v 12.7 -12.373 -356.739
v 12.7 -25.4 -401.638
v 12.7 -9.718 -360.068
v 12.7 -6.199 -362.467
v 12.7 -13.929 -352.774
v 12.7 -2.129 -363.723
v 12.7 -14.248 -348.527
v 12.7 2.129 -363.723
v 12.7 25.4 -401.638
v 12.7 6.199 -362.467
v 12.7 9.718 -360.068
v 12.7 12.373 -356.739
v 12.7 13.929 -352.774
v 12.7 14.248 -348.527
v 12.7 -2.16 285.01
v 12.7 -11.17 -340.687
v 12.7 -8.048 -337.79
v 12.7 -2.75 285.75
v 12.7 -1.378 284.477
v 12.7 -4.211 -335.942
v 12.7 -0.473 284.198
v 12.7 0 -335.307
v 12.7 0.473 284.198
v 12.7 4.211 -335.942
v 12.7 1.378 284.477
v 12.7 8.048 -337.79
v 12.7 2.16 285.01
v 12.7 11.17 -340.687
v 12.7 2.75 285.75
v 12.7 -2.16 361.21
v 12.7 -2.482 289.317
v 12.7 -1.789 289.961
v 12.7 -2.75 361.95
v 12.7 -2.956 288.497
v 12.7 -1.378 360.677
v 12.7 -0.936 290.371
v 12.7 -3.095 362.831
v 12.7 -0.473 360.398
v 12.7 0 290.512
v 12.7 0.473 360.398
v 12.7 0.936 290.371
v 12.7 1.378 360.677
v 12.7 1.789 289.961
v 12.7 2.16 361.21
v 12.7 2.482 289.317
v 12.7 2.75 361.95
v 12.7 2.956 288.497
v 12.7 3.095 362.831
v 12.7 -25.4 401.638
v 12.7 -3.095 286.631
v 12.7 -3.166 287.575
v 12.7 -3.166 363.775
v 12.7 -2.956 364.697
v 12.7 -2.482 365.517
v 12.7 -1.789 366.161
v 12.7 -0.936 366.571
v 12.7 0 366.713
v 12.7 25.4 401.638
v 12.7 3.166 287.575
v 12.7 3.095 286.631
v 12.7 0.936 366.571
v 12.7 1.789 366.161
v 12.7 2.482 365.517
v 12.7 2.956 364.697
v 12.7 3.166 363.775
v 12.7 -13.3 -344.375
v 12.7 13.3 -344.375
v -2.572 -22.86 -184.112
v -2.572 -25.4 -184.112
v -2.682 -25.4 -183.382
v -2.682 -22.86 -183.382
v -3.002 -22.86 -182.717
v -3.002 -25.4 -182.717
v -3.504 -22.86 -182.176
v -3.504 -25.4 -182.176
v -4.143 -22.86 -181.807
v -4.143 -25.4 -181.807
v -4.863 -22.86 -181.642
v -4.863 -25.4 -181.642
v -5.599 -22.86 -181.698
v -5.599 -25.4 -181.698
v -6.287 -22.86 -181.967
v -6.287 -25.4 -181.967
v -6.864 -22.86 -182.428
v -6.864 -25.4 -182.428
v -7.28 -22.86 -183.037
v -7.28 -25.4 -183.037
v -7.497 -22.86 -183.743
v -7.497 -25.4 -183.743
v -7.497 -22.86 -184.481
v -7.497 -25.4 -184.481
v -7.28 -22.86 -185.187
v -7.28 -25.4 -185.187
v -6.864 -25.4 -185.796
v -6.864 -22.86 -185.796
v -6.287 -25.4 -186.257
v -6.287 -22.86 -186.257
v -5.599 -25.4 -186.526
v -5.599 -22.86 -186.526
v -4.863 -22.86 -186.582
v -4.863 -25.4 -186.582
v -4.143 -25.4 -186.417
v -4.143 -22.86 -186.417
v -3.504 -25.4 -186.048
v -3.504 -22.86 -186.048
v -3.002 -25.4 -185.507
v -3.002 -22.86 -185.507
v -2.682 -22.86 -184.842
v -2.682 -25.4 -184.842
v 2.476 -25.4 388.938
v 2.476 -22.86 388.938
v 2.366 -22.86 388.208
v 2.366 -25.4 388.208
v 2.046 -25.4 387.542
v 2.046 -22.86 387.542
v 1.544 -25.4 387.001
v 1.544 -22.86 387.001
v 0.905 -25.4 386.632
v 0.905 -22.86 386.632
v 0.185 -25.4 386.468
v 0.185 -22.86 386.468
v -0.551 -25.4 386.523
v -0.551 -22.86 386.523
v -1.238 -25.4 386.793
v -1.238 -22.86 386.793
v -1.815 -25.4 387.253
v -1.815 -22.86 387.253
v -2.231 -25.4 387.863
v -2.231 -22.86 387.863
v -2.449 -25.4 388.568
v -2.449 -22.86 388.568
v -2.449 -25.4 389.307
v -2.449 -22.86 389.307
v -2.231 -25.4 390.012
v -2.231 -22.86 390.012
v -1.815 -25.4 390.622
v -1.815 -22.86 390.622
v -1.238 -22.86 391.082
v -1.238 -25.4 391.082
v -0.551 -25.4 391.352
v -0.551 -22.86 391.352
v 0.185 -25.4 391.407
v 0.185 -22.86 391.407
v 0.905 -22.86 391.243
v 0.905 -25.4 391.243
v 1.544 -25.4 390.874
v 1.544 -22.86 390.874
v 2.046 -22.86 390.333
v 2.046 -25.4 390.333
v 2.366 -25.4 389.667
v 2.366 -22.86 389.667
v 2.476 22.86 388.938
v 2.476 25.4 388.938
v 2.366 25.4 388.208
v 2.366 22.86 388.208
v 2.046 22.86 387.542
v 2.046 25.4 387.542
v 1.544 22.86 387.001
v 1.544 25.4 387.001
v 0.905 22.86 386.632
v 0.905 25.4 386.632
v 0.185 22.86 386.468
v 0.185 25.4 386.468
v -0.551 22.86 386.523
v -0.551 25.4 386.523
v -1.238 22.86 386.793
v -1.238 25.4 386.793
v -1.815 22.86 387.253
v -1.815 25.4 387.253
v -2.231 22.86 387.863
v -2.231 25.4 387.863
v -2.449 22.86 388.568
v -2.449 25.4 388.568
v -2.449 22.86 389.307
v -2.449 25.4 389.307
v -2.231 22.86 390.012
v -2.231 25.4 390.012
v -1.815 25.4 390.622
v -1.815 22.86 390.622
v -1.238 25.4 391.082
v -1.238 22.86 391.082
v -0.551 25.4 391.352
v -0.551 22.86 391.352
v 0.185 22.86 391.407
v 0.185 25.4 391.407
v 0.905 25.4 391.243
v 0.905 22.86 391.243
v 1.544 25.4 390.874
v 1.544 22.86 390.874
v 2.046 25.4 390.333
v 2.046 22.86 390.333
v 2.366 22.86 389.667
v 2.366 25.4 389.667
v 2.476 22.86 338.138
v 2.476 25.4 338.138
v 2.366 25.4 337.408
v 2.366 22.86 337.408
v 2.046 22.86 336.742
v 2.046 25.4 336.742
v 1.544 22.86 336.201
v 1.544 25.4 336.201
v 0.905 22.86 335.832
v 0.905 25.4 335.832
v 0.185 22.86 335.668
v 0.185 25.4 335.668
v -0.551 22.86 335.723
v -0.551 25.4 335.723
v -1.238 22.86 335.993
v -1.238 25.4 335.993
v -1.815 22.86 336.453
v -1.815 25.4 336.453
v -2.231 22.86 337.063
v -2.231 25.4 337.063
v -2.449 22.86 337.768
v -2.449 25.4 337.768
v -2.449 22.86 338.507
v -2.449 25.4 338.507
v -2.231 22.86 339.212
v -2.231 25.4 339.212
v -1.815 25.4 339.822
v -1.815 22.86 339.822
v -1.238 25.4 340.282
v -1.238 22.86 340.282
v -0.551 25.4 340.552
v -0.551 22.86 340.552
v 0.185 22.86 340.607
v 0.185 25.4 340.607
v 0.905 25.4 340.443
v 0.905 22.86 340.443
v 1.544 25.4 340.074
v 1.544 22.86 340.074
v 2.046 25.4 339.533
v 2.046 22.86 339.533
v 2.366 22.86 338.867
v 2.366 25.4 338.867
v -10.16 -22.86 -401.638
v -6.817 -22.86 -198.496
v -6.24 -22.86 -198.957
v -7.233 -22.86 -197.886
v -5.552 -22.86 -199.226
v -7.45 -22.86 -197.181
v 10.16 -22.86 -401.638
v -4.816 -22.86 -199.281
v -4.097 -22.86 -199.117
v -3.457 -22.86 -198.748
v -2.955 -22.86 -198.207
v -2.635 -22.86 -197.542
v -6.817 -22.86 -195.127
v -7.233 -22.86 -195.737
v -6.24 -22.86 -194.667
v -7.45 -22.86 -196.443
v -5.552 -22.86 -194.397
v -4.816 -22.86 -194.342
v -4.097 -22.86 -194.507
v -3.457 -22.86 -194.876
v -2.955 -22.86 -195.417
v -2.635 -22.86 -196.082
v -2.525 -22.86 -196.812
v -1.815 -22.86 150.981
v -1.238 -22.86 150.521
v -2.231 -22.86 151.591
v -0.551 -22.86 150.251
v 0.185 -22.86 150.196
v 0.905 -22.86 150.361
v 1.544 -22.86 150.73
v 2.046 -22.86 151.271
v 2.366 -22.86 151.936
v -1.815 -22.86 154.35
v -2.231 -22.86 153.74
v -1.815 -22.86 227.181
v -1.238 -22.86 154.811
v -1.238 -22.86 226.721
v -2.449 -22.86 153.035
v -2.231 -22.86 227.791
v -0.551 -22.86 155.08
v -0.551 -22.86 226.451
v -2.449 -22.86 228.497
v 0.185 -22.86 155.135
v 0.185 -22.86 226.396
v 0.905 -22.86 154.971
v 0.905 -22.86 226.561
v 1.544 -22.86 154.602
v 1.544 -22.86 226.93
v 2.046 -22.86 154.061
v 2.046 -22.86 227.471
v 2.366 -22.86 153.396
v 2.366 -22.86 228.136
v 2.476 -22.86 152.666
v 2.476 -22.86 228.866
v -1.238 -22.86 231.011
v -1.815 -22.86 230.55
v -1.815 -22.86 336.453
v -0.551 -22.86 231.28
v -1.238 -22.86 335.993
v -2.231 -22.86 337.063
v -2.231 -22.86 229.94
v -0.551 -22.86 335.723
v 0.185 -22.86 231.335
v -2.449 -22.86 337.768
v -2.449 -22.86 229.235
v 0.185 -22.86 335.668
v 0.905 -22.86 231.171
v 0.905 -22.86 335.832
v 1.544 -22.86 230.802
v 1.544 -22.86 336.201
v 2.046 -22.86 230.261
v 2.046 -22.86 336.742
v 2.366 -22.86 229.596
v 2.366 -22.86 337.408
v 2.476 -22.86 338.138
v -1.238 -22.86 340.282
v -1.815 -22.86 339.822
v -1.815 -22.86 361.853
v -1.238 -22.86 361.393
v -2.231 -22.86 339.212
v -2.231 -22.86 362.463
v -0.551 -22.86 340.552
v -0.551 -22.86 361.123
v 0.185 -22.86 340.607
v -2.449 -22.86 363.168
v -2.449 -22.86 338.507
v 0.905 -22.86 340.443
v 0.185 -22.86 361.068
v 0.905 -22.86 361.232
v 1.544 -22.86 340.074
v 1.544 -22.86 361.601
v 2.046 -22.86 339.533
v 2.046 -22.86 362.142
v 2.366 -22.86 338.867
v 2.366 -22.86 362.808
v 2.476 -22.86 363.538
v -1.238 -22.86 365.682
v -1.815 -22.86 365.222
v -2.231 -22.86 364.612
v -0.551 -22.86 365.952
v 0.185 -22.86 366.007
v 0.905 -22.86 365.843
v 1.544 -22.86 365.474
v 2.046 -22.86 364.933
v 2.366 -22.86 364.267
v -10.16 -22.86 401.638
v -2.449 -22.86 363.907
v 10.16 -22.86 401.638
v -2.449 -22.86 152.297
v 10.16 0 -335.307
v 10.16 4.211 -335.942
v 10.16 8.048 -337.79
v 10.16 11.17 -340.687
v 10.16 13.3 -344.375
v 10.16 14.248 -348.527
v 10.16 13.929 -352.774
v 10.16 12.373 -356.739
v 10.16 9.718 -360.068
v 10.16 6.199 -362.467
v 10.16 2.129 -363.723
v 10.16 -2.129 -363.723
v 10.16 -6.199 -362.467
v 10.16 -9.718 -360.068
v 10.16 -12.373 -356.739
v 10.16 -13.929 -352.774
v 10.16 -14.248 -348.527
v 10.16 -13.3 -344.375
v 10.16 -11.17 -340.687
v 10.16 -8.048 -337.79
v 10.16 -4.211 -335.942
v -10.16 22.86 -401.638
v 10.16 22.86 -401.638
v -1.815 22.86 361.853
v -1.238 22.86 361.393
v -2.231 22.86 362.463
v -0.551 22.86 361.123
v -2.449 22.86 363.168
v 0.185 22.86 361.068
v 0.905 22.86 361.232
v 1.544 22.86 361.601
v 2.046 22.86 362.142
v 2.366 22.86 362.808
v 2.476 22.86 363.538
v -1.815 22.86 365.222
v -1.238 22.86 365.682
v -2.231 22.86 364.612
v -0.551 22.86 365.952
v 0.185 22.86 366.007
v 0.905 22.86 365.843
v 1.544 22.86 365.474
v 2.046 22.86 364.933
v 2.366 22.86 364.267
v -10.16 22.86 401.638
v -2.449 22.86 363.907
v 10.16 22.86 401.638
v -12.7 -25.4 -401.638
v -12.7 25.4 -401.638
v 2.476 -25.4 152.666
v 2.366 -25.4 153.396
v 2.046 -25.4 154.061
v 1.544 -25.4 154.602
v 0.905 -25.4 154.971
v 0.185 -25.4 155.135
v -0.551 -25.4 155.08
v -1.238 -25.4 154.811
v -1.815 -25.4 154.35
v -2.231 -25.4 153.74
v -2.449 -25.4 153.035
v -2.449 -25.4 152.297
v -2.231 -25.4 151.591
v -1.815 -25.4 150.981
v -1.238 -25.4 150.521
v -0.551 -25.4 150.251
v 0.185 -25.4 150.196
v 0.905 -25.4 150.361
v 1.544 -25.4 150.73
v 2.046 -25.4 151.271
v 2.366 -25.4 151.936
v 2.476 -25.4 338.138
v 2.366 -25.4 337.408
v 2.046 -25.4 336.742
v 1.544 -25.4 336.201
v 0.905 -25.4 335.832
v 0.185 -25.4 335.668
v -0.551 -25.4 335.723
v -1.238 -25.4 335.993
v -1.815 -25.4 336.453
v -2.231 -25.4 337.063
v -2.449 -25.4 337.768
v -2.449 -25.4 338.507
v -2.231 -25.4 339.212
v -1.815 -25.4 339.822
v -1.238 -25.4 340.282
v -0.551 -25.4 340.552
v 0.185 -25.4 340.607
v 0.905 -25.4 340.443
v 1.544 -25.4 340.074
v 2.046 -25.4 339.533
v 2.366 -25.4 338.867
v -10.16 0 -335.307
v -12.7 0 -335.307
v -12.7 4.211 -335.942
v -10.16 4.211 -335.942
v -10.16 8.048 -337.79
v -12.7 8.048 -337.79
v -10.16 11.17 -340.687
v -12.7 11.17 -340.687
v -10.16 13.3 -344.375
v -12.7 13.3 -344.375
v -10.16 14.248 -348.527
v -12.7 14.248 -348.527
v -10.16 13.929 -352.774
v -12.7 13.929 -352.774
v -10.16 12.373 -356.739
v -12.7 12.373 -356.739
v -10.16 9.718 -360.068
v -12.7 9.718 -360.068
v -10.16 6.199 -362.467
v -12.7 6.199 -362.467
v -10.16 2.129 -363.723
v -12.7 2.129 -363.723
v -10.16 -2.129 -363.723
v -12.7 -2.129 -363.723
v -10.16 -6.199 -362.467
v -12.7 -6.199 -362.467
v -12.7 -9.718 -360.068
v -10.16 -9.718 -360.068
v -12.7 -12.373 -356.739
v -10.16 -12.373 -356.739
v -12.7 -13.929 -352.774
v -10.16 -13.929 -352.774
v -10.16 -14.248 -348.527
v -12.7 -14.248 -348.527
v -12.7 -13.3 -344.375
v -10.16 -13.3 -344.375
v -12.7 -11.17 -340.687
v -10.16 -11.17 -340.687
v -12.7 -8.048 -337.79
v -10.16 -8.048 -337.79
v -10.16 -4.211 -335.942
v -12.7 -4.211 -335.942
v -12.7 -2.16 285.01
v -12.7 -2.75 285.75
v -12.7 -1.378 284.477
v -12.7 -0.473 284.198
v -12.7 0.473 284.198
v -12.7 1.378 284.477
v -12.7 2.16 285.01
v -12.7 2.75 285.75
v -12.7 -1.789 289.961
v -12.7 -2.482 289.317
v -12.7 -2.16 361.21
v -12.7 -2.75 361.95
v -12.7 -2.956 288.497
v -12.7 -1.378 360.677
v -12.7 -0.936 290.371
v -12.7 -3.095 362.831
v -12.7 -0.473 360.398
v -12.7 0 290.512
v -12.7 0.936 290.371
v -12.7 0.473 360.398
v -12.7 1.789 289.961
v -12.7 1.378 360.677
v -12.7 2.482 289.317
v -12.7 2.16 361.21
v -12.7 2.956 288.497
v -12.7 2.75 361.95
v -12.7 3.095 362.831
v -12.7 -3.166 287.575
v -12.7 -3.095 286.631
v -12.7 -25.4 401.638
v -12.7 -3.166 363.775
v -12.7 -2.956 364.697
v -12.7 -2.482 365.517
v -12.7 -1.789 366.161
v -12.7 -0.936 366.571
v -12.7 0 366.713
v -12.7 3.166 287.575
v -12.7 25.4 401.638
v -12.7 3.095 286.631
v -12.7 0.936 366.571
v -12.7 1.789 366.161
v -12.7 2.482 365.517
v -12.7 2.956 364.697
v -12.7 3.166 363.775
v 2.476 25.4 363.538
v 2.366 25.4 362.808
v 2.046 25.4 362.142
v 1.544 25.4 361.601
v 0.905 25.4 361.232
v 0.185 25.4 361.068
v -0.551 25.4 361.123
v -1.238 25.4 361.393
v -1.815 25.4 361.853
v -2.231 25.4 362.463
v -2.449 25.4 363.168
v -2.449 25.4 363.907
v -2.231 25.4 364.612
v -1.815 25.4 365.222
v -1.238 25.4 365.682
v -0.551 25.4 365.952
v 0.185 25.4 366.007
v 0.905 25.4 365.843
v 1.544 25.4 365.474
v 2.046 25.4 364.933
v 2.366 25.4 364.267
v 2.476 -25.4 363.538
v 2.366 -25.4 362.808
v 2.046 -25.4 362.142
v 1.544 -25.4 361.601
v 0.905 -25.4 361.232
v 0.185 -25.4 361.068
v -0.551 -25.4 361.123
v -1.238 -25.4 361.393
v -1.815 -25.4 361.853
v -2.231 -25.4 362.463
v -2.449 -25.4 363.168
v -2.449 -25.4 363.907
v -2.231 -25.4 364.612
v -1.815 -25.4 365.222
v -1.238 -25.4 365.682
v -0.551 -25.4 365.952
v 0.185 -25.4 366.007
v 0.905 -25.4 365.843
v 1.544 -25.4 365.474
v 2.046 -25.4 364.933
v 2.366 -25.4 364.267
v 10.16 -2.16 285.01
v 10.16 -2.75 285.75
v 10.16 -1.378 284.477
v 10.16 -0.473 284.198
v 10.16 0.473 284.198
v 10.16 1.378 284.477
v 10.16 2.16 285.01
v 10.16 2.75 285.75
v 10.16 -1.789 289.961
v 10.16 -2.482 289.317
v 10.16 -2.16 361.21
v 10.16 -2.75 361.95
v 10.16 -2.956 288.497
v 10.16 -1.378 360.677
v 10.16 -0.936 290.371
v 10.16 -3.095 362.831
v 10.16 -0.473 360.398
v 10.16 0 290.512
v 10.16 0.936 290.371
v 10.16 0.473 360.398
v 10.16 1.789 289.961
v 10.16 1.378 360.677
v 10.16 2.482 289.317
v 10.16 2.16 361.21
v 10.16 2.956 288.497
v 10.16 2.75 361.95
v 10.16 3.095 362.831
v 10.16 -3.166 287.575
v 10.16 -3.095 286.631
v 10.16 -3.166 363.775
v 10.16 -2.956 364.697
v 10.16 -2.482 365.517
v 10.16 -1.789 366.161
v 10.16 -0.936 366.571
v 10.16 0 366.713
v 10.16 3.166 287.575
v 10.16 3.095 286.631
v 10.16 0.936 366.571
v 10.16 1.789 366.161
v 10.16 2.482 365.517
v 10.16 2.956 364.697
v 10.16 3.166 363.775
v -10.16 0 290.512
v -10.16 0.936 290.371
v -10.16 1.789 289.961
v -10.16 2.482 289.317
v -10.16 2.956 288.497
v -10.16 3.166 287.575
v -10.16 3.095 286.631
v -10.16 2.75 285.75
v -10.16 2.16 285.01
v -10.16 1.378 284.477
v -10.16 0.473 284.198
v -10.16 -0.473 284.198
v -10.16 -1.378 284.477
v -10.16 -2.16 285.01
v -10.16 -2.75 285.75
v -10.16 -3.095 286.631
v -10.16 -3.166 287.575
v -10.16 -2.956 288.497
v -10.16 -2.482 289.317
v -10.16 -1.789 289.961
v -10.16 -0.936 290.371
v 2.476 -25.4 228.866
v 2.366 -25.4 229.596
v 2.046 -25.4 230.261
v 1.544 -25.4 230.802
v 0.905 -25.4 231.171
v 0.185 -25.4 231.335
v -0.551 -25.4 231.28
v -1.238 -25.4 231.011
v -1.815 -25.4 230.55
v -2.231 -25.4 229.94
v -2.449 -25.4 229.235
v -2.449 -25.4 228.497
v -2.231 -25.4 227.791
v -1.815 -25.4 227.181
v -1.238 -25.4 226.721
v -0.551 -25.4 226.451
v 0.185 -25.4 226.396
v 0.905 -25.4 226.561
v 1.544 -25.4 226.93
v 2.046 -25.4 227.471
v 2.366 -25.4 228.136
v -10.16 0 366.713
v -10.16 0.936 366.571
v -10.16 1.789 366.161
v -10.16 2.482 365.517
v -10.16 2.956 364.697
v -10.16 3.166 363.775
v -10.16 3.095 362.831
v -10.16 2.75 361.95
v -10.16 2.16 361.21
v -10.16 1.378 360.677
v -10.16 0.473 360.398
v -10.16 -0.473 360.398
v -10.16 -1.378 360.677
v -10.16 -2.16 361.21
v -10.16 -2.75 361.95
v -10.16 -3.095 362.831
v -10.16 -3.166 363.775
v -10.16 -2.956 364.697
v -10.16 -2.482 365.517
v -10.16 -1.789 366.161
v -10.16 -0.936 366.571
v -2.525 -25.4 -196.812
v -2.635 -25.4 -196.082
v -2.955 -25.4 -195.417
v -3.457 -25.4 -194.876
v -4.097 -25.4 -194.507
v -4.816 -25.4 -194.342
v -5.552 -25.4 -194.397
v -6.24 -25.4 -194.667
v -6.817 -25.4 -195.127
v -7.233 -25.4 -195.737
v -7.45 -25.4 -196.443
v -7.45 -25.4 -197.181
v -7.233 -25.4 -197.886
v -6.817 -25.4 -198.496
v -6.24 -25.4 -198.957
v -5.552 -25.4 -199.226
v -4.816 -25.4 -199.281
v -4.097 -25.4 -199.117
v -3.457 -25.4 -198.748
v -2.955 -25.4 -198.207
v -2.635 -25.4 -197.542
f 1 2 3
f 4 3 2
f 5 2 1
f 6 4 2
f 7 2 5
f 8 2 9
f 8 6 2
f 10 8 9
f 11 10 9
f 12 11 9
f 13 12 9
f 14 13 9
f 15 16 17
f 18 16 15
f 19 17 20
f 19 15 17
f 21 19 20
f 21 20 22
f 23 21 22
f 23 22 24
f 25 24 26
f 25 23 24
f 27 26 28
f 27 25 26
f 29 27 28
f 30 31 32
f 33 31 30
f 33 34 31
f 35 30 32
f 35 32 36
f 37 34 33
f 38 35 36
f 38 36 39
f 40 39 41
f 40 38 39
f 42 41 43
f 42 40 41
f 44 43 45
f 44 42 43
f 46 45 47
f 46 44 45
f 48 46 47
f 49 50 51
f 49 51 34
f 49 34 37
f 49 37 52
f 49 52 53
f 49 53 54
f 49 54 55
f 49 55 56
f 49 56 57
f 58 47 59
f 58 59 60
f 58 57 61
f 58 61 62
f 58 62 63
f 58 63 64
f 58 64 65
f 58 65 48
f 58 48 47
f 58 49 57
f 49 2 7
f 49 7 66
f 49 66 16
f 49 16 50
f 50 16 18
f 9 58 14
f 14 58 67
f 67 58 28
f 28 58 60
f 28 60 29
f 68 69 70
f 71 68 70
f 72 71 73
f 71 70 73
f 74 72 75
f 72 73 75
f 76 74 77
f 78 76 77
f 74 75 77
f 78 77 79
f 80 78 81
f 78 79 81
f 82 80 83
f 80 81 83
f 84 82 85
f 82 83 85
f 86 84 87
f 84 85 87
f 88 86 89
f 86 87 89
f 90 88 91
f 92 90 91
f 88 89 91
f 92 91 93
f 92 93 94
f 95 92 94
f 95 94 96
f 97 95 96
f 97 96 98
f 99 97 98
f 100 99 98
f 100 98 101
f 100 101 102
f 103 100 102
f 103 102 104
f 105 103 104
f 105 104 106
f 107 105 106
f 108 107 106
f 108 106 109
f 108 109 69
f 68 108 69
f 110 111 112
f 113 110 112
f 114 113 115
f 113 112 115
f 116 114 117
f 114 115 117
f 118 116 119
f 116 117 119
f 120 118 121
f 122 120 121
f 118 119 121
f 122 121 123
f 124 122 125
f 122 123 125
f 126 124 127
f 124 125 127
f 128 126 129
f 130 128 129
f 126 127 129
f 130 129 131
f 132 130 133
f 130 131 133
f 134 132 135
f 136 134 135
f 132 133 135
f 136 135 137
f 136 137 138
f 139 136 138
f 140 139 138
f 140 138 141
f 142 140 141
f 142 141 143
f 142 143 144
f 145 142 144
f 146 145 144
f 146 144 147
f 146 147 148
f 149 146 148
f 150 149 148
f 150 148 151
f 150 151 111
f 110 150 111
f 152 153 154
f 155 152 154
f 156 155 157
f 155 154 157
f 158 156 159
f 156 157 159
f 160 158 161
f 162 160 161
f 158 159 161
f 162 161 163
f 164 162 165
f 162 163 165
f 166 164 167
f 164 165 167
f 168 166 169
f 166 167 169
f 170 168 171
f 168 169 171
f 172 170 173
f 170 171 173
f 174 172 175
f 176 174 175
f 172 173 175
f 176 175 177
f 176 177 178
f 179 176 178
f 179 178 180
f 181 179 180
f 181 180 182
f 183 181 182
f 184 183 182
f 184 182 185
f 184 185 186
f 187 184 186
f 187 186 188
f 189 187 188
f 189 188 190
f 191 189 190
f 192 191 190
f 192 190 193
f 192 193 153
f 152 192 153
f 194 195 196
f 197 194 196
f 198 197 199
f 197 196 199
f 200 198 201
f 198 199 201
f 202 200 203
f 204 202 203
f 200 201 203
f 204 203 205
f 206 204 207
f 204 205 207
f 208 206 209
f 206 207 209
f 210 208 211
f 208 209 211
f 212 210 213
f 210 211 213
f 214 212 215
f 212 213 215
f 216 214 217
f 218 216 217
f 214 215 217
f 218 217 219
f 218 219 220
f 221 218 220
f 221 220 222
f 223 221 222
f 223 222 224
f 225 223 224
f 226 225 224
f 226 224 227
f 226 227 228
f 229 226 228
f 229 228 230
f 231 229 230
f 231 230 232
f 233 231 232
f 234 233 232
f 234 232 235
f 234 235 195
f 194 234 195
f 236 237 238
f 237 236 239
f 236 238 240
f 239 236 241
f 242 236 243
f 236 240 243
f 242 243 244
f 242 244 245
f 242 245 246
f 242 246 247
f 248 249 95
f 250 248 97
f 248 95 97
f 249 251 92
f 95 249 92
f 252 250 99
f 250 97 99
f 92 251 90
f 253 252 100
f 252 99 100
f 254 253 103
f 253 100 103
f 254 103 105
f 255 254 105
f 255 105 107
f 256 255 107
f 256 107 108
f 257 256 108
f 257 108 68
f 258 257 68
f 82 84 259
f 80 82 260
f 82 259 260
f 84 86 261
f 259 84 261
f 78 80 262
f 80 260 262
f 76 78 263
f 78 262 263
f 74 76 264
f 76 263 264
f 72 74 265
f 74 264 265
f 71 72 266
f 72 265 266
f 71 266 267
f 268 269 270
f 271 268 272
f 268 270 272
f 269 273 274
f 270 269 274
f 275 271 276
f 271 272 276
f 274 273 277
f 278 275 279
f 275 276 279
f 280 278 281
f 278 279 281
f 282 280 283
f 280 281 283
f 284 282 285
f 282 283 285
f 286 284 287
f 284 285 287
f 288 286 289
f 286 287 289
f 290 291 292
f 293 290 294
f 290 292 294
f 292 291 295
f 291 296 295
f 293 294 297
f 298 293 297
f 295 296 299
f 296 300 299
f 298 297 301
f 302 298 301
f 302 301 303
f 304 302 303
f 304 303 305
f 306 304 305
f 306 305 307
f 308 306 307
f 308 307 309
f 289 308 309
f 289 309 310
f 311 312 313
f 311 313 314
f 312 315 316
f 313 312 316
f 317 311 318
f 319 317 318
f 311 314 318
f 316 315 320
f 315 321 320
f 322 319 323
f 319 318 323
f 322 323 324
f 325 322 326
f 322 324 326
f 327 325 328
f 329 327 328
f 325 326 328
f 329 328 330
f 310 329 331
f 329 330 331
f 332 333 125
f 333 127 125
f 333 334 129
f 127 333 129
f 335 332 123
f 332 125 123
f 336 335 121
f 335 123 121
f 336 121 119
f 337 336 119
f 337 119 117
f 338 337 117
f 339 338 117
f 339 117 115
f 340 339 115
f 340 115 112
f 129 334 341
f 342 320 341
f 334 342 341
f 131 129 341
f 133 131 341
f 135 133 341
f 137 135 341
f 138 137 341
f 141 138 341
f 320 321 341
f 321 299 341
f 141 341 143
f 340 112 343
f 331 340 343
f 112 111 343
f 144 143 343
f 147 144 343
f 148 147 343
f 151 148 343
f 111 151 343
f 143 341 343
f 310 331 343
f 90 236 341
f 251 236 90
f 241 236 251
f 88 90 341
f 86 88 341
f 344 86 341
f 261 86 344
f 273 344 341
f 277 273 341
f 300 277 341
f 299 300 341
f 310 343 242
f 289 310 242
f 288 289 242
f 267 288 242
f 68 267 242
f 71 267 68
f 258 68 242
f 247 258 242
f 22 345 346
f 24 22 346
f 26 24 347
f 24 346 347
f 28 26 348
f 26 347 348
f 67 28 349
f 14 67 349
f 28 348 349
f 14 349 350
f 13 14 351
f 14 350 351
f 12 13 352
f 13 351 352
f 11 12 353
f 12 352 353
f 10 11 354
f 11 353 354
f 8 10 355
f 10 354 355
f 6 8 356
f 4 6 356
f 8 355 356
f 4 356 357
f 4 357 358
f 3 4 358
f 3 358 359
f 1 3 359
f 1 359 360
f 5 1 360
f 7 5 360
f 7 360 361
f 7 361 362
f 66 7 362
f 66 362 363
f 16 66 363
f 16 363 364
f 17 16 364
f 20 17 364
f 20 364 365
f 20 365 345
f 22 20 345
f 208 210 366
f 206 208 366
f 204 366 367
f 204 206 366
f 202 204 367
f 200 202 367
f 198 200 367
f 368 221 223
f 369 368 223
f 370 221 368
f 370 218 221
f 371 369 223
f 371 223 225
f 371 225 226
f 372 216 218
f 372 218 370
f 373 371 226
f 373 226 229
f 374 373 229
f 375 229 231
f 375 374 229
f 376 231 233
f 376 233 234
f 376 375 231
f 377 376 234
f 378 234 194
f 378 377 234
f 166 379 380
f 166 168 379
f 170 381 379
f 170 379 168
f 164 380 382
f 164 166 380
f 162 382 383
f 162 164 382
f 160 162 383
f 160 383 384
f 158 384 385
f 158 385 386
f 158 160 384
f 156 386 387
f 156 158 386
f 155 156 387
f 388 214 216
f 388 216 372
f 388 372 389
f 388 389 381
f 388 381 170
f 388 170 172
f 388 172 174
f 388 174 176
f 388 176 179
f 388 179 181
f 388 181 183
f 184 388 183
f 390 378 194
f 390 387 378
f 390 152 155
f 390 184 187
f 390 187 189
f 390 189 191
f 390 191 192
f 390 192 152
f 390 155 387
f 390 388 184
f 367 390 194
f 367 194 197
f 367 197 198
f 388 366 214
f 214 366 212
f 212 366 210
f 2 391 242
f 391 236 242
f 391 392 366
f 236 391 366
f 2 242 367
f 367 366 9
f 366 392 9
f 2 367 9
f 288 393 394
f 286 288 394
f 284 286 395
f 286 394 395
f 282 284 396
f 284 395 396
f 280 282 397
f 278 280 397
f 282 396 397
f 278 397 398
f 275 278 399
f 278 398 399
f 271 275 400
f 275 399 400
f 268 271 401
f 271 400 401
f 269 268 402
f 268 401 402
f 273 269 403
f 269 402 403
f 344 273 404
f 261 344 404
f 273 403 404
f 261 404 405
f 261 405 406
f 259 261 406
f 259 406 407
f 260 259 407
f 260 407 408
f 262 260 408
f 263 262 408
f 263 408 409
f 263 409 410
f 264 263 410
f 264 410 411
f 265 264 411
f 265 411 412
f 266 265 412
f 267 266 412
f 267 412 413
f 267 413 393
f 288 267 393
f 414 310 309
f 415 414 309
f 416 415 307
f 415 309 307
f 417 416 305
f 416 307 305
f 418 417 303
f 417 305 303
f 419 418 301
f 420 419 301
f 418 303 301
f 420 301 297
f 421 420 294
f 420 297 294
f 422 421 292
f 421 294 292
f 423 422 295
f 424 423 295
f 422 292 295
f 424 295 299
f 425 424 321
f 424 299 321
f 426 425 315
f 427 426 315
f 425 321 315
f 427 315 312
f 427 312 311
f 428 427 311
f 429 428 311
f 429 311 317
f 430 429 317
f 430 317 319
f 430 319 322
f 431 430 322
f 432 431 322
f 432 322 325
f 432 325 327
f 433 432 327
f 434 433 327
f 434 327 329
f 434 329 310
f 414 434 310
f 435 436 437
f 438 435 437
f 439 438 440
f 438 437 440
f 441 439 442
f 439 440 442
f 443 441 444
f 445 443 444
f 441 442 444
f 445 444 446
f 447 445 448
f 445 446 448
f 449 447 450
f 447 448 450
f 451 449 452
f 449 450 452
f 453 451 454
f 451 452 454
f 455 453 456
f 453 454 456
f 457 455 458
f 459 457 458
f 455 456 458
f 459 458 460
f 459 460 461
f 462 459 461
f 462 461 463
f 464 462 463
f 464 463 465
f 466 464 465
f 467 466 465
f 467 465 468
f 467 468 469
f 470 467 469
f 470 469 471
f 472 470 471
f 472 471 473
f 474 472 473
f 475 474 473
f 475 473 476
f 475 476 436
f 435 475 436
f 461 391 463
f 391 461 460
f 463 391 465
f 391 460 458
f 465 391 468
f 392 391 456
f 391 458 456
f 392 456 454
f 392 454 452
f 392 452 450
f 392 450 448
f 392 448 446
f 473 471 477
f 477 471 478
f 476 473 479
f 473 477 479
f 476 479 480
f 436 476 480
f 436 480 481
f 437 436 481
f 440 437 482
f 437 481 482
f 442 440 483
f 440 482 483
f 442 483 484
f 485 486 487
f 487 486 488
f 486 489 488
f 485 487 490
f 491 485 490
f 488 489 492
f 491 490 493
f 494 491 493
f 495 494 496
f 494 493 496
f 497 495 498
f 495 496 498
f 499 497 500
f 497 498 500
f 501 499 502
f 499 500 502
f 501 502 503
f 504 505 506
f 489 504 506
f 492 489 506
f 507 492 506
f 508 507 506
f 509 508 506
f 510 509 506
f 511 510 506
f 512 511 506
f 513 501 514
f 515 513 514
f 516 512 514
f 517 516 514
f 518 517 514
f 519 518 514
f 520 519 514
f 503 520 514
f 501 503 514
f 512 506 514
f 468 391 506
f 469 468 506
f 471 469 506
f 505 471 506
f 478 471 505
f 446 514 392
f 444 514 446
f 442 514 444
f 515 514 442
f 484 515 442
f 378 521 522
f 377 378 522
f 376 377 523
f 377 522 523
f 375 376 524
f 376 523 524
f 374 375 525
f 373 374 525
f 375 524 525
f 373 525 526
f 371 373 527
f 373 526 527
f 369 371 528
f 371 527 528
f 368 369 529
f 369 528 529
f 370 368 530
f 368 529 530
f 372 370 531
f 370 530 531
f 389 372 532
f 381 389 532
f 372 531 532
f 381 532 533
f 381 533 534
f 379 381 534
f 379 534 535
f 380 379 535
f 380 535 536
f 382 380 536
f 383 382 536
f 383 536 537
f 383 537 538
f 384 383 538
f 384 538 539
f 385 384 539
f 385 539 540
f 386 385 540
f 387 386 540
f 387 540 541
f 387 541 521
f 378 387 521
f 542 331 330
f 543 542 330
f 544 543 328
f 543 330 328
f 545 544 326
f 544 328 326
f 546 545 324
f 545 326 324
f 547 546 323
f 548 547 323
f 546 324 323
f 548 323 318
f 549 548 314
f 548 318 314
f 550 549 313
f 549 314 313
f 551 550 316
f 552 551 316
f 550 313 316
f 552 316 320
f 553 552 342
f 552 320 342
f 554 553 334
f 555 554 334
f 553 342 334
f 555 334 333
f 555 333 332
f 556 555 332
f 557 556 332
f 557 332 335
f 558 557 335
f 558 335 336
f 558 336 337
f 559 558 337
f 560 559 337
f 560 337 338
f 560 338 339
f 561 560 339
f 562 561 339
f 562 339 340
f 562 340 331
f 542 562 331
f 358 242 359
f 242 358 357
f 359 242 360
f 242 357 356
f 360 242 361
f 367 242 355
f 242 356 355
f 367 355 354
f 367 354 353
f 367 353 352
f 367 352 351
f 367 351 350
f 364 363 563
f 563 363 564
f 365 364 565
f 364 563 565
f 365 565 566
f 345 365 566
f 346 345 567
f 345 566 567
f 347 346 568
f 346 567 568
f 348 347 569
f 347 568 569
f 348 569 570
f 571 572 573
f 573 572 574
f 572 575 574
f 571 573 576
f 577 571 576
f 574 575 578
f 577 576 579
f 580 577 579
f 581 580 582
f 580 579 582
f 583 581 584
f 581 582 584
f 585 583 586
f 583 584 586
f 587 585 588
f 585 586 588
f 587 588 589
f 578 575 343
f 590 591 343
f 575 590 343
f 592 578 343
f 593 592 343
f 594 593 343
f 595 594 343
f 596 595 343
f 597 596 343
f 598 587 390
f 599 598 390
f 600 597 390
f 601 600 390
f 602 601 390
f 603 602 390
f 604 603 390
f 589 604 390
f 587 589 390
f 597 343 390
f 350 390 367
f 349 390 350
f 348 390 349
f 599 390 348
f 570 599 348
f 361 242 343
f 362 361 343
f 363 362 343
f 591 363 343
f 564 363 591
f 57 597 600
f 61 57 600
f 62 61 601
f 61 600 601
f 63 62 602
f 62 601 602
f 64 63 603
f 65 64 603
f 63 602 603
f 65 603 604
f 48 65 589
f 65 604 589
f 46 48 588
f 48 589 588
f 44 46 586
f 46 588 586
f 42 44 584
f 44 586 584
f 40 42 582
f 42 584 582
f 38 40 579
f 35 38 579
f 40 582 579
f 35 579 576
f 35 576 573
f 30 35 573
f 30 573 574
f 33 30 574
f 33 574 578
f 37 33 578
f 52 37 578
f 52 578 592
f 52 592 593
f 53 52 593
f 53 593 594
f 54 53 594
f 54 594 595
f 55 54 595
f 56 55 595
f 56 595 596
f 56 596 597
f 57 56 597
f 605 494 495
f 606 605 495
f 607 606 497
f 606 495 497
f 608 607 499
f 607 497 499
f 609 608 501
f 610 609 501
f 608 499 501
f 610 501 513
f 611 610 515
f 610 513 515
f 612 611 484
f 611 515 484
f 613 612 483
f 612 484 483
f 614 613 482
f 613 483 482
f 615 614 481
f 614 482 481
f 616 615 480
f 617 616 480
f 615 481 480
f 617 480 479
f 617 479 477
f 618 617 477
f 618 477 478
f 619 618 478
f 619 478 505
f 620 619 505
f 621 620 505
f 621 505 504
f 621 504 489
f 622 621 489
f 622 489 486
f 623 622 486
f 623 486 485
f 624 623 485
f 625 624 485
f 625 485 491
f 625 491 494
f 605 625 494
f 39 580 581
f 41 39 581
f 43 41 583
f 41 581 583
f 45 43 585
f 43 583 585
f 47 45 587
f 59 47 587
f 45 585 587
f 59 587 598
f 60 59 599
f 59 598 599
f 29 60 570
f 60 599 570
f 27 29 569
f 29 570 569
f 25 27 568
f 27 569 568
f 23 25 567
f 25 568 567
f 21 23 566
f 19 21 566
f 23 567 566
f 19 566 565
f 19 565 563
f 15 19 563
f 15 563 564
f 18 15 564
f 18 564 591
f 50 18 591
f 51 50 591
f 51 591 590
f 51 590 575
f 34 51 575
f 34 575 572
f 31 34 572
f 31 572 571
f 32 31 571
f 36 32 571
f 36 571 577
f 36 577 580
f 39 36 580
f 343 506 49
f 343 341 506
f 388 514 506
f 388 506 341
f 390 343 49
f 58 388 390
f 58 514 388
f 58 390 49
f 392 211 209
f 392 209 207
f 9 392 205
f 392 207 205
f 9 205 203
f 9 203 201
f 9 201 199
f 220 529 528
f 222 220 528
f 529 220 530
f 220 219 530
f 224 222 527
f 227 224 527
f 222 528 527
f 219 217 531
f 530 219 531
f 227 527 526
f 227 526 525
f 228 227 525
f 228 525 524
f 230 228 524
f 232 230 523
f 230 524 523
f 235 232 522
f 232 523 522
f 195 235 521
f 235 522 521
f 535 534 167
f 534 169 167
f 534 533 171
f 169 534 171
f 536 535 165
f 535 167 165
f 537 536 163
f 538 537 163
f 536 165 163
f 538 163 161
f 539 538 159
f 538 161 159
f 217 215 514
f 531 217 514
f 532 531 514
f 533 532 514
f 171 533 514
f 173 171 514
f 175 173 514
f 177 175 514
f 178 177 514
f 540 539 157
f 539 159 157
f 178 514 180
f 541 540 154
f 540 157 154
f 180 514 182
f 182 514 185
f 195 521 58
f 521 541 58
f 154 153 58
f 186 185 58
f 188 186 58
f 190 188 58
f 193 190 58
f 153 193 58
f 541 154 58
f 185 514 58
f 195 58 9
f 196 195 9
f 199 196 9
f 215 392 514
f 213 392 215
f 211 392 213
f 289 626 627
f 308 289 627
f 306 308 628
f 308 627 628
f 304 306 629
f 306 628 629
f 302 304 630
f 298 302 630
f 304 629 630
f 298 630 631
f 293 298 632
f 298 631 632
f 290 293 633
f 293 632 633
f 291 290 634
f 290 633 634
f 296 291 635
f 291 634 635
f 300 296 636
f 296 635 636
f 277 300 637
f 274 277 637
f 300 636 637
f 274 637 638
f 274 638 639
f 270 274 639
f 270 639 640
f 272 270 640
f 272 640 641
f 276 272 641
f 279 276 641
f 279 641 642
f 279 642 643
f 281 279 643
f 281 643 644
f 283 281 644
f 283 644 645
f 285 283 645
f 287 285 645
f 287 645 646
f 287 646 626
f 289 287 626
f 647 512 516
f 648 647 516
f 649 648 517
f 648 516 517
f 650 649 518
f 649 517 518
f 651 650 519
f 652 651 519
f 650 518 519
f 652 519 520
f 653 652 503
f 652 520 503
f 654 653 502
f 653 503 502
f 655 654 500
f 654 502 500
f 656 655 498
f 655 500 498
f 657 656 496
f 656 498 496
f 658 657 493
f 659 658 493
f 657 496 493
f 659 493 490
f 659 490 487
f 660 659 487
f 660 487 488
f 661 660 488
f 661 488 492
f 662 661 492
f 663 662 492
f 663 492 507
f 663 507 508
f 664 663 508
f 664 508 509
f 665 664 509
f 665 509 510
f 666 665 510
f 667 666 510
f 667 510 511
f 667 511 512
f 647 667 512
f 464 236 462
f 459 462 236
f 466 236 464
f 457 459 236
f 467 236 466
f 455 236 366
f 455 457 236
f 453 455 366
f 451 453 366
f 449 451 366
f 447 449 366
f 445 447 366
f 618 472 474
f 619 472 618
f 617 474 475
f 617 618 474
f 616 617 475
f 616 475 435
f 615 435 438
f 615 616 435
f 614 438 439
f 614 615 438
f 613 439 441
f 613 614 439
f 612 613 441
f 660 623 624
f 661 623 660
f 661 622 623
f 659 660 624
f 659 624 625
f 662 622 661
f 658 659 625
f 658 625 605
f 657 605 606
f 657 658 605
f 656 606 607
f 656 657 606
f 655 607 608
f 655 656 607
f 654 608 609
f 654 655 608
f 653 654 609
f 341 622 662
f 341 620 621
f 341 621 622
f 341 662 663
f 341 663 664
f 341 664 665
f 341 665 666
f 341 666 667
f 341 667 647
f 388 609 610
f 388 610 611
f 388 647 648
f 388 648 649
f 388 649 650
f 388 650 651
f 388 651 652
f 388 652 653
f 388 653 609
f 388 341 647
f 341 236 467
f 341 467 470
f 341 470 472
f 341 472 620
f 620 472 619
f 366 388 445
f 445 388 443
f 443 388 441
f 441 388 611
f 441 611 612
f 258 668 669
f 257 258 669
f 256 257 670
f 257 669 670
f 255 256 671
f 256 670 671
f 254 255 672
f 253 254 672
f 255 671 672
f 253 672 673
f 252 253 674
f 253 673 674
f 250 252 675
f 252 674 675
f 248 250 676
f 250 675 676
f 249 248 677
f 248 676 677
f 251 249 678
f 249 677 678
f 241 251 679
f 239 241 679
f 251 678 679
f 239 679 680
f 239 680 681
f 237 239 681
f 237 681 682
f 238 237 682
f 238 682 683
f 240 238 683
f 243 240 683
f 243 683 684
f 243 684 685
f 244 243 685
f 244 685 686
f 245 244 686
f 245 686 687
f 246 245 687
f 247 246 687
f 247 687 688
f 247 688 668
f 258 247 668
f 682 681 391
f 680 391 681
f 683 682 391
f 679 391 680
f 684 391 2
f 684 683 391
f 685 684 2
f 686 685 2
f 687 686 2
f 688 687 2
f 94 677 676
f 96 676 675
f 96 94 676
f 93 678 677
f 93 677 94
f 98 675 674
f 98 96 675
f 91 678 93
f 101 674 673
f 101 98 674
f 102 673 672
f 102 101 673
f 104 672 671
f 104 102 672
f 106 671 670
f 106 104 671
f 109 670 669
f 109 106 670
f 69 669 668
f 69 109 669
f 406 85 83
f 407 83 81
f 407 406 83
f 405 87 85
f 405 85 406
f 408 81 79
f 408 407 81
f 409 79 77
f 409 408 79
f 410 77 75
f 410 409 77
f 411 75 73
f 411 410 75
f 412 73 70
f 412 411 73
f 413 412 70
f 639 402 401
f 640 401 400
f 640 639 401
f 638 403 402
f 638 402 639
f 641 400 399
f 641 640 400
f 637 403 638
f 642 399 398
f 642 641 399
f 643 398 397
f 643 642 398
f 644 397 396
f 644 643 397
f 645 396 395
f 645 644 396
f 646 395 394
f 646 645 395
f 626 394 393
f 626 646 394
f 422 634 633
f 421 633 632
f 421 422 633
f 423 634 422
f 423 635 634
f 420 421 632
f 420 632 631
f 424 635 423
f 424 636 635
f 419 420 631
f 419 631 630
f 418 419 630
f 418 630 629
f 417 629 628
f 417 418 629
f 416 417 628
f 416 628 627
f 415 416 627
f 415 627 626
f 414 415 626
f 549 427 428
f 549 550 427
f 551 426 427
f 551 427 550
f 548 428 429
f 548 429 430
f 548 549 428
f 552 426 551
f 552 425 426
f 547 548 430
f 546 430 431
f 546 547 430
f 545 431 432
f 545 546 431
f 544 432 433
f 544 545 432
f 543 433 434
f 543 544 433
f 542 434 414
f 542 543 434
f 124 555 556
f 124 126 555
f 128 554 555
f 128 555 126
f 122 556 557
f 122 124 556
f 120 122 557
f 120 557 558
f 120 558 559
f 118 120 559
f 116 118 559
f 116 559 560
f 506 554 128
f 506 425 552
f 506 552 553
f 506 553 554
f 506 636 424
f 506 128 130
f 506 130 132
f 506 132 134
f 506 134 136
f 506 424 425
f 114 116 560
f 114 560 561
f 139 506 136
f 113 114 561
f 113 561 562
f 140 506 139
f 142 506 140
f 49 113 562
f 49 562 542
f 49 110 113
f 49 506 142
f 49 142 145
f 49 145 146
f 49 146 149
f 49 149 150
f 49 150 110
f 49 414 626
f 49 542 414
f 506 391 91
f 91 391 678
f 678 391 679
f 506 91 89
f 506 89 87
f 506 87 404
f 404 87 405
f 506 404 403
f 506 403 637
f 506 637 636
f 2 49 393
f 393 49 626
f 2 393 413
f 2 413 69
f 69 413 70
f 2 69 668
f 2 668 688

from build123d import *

# Parameters (mm, degrees)
SKETCH1_W           = 25.4
SKETCH1_H           = 50.8
SKETCH1_W_2         = 20.32
SKETCH1_H_2         = 45.72
EXTRUDE_THIN1_DEPTH = 401.6375
SKETCH2_R           = 14.2875
CUT_EXTRUDE1_DEPTH  = 26.4
SKETCH3_R           = 3.175
CUT_EXTRUDE2_DEPTH  = 26.4
SKETCH5_R           = 2.4765
CUT_EXTRUDE4_DEPTH  = 3.81
SKETCH7_R           = 2.4765
CUT_EXTRUDE5_DEPTH  = 51.8
SKETCH8_R           = 2.476504233
CUT_EXTRUDE6_DEPTH  = 3.81


with BuildPart() as part:
    # Sketch1 → Extrude-Thin1 (new body, symmetric)
    with BuildSketch(Plane.XY):
        Rectangle(SKETCH1_W, SKETCH1_H)
        Rectangle(SKETCH1_W_2, SKETCH1_H_2, mode=Mode.SUBTRACT)
    extrude(amount=EXTRUDE_THIN1_DEPTH, both=True)

    # Sketch2 → Cut-Extrude1 (cut, through all)
    with BuildSketch(Plane.ZY.offset(12.7)):
        with Locations((-349.59481695, 0)):
            Circle(SKETCH2_R)
    extrude(amount=-CUT_EXTRUDE1_DEPTH, mode=Mode.SUBTRACT)

    # Sketch3 → Cut-Extrude2 (cut, through all)
    with BuildSketch(Plane.ZY.offset(12.7)):
        with Locations((363.5375, 0)):
            Circle(SKETCH3_R)
        with Locations((287.3375, 0)):
            Circle(SKETCH3_R)
    extrude(amount=-CUT_EXTRUDE2_DEPTH, mode=Mode.SUBTRACT)

    # Sketch5 → Cut-Extrude4 (cut)
    with BuildSketch(Plane.XZ.offset(25.4)):
        with Locations((-5.11e-06, 228.865824925)):
            Circle(SKETCH5_R)
        with Locations((0, 152.665824925)):
            Circle(SKETCH5_R)
    extrude(amount=-CUT_EXTRUDE4_DEPTH, mode=Mode.SUBTRACT)

    # Sketch7 → Cut-Extrude5 (cut, through all)
    with BuildSketch(Plane(origin=(0, 25.4, 0), x_dir=(1, 0, 0), z_dir=(0, 1, 0))):
        with Locations((0, -338.1375)):
            Circle(SKETCH7_R)
        with Locations((0, -363.5375)):
            Circle(SKETCH7_R)
        with Locations((0, -388.9375)):
            Circle(SKETCH7_R)
    extrude(amount=-CUT_EXTRUDE5_DEPTH, mode=Mode.SUBTRACT)

    # Sketch8 → Cut-Extrude6 (cut)
    with BuildSketch(Plane.XZ.offset(25.4)):
        with Locations((-5.001306037, -196.8119)):
            Circle(SKETCH8_R)
        with Locations((-5.048266279, -184.111986821)):
            Circle(SKETCH8_R)
    extrude(amount=-CUT_EXTRUDE6_DEPTH, mode=Mode.SUBTRACT)


solid = part.part
